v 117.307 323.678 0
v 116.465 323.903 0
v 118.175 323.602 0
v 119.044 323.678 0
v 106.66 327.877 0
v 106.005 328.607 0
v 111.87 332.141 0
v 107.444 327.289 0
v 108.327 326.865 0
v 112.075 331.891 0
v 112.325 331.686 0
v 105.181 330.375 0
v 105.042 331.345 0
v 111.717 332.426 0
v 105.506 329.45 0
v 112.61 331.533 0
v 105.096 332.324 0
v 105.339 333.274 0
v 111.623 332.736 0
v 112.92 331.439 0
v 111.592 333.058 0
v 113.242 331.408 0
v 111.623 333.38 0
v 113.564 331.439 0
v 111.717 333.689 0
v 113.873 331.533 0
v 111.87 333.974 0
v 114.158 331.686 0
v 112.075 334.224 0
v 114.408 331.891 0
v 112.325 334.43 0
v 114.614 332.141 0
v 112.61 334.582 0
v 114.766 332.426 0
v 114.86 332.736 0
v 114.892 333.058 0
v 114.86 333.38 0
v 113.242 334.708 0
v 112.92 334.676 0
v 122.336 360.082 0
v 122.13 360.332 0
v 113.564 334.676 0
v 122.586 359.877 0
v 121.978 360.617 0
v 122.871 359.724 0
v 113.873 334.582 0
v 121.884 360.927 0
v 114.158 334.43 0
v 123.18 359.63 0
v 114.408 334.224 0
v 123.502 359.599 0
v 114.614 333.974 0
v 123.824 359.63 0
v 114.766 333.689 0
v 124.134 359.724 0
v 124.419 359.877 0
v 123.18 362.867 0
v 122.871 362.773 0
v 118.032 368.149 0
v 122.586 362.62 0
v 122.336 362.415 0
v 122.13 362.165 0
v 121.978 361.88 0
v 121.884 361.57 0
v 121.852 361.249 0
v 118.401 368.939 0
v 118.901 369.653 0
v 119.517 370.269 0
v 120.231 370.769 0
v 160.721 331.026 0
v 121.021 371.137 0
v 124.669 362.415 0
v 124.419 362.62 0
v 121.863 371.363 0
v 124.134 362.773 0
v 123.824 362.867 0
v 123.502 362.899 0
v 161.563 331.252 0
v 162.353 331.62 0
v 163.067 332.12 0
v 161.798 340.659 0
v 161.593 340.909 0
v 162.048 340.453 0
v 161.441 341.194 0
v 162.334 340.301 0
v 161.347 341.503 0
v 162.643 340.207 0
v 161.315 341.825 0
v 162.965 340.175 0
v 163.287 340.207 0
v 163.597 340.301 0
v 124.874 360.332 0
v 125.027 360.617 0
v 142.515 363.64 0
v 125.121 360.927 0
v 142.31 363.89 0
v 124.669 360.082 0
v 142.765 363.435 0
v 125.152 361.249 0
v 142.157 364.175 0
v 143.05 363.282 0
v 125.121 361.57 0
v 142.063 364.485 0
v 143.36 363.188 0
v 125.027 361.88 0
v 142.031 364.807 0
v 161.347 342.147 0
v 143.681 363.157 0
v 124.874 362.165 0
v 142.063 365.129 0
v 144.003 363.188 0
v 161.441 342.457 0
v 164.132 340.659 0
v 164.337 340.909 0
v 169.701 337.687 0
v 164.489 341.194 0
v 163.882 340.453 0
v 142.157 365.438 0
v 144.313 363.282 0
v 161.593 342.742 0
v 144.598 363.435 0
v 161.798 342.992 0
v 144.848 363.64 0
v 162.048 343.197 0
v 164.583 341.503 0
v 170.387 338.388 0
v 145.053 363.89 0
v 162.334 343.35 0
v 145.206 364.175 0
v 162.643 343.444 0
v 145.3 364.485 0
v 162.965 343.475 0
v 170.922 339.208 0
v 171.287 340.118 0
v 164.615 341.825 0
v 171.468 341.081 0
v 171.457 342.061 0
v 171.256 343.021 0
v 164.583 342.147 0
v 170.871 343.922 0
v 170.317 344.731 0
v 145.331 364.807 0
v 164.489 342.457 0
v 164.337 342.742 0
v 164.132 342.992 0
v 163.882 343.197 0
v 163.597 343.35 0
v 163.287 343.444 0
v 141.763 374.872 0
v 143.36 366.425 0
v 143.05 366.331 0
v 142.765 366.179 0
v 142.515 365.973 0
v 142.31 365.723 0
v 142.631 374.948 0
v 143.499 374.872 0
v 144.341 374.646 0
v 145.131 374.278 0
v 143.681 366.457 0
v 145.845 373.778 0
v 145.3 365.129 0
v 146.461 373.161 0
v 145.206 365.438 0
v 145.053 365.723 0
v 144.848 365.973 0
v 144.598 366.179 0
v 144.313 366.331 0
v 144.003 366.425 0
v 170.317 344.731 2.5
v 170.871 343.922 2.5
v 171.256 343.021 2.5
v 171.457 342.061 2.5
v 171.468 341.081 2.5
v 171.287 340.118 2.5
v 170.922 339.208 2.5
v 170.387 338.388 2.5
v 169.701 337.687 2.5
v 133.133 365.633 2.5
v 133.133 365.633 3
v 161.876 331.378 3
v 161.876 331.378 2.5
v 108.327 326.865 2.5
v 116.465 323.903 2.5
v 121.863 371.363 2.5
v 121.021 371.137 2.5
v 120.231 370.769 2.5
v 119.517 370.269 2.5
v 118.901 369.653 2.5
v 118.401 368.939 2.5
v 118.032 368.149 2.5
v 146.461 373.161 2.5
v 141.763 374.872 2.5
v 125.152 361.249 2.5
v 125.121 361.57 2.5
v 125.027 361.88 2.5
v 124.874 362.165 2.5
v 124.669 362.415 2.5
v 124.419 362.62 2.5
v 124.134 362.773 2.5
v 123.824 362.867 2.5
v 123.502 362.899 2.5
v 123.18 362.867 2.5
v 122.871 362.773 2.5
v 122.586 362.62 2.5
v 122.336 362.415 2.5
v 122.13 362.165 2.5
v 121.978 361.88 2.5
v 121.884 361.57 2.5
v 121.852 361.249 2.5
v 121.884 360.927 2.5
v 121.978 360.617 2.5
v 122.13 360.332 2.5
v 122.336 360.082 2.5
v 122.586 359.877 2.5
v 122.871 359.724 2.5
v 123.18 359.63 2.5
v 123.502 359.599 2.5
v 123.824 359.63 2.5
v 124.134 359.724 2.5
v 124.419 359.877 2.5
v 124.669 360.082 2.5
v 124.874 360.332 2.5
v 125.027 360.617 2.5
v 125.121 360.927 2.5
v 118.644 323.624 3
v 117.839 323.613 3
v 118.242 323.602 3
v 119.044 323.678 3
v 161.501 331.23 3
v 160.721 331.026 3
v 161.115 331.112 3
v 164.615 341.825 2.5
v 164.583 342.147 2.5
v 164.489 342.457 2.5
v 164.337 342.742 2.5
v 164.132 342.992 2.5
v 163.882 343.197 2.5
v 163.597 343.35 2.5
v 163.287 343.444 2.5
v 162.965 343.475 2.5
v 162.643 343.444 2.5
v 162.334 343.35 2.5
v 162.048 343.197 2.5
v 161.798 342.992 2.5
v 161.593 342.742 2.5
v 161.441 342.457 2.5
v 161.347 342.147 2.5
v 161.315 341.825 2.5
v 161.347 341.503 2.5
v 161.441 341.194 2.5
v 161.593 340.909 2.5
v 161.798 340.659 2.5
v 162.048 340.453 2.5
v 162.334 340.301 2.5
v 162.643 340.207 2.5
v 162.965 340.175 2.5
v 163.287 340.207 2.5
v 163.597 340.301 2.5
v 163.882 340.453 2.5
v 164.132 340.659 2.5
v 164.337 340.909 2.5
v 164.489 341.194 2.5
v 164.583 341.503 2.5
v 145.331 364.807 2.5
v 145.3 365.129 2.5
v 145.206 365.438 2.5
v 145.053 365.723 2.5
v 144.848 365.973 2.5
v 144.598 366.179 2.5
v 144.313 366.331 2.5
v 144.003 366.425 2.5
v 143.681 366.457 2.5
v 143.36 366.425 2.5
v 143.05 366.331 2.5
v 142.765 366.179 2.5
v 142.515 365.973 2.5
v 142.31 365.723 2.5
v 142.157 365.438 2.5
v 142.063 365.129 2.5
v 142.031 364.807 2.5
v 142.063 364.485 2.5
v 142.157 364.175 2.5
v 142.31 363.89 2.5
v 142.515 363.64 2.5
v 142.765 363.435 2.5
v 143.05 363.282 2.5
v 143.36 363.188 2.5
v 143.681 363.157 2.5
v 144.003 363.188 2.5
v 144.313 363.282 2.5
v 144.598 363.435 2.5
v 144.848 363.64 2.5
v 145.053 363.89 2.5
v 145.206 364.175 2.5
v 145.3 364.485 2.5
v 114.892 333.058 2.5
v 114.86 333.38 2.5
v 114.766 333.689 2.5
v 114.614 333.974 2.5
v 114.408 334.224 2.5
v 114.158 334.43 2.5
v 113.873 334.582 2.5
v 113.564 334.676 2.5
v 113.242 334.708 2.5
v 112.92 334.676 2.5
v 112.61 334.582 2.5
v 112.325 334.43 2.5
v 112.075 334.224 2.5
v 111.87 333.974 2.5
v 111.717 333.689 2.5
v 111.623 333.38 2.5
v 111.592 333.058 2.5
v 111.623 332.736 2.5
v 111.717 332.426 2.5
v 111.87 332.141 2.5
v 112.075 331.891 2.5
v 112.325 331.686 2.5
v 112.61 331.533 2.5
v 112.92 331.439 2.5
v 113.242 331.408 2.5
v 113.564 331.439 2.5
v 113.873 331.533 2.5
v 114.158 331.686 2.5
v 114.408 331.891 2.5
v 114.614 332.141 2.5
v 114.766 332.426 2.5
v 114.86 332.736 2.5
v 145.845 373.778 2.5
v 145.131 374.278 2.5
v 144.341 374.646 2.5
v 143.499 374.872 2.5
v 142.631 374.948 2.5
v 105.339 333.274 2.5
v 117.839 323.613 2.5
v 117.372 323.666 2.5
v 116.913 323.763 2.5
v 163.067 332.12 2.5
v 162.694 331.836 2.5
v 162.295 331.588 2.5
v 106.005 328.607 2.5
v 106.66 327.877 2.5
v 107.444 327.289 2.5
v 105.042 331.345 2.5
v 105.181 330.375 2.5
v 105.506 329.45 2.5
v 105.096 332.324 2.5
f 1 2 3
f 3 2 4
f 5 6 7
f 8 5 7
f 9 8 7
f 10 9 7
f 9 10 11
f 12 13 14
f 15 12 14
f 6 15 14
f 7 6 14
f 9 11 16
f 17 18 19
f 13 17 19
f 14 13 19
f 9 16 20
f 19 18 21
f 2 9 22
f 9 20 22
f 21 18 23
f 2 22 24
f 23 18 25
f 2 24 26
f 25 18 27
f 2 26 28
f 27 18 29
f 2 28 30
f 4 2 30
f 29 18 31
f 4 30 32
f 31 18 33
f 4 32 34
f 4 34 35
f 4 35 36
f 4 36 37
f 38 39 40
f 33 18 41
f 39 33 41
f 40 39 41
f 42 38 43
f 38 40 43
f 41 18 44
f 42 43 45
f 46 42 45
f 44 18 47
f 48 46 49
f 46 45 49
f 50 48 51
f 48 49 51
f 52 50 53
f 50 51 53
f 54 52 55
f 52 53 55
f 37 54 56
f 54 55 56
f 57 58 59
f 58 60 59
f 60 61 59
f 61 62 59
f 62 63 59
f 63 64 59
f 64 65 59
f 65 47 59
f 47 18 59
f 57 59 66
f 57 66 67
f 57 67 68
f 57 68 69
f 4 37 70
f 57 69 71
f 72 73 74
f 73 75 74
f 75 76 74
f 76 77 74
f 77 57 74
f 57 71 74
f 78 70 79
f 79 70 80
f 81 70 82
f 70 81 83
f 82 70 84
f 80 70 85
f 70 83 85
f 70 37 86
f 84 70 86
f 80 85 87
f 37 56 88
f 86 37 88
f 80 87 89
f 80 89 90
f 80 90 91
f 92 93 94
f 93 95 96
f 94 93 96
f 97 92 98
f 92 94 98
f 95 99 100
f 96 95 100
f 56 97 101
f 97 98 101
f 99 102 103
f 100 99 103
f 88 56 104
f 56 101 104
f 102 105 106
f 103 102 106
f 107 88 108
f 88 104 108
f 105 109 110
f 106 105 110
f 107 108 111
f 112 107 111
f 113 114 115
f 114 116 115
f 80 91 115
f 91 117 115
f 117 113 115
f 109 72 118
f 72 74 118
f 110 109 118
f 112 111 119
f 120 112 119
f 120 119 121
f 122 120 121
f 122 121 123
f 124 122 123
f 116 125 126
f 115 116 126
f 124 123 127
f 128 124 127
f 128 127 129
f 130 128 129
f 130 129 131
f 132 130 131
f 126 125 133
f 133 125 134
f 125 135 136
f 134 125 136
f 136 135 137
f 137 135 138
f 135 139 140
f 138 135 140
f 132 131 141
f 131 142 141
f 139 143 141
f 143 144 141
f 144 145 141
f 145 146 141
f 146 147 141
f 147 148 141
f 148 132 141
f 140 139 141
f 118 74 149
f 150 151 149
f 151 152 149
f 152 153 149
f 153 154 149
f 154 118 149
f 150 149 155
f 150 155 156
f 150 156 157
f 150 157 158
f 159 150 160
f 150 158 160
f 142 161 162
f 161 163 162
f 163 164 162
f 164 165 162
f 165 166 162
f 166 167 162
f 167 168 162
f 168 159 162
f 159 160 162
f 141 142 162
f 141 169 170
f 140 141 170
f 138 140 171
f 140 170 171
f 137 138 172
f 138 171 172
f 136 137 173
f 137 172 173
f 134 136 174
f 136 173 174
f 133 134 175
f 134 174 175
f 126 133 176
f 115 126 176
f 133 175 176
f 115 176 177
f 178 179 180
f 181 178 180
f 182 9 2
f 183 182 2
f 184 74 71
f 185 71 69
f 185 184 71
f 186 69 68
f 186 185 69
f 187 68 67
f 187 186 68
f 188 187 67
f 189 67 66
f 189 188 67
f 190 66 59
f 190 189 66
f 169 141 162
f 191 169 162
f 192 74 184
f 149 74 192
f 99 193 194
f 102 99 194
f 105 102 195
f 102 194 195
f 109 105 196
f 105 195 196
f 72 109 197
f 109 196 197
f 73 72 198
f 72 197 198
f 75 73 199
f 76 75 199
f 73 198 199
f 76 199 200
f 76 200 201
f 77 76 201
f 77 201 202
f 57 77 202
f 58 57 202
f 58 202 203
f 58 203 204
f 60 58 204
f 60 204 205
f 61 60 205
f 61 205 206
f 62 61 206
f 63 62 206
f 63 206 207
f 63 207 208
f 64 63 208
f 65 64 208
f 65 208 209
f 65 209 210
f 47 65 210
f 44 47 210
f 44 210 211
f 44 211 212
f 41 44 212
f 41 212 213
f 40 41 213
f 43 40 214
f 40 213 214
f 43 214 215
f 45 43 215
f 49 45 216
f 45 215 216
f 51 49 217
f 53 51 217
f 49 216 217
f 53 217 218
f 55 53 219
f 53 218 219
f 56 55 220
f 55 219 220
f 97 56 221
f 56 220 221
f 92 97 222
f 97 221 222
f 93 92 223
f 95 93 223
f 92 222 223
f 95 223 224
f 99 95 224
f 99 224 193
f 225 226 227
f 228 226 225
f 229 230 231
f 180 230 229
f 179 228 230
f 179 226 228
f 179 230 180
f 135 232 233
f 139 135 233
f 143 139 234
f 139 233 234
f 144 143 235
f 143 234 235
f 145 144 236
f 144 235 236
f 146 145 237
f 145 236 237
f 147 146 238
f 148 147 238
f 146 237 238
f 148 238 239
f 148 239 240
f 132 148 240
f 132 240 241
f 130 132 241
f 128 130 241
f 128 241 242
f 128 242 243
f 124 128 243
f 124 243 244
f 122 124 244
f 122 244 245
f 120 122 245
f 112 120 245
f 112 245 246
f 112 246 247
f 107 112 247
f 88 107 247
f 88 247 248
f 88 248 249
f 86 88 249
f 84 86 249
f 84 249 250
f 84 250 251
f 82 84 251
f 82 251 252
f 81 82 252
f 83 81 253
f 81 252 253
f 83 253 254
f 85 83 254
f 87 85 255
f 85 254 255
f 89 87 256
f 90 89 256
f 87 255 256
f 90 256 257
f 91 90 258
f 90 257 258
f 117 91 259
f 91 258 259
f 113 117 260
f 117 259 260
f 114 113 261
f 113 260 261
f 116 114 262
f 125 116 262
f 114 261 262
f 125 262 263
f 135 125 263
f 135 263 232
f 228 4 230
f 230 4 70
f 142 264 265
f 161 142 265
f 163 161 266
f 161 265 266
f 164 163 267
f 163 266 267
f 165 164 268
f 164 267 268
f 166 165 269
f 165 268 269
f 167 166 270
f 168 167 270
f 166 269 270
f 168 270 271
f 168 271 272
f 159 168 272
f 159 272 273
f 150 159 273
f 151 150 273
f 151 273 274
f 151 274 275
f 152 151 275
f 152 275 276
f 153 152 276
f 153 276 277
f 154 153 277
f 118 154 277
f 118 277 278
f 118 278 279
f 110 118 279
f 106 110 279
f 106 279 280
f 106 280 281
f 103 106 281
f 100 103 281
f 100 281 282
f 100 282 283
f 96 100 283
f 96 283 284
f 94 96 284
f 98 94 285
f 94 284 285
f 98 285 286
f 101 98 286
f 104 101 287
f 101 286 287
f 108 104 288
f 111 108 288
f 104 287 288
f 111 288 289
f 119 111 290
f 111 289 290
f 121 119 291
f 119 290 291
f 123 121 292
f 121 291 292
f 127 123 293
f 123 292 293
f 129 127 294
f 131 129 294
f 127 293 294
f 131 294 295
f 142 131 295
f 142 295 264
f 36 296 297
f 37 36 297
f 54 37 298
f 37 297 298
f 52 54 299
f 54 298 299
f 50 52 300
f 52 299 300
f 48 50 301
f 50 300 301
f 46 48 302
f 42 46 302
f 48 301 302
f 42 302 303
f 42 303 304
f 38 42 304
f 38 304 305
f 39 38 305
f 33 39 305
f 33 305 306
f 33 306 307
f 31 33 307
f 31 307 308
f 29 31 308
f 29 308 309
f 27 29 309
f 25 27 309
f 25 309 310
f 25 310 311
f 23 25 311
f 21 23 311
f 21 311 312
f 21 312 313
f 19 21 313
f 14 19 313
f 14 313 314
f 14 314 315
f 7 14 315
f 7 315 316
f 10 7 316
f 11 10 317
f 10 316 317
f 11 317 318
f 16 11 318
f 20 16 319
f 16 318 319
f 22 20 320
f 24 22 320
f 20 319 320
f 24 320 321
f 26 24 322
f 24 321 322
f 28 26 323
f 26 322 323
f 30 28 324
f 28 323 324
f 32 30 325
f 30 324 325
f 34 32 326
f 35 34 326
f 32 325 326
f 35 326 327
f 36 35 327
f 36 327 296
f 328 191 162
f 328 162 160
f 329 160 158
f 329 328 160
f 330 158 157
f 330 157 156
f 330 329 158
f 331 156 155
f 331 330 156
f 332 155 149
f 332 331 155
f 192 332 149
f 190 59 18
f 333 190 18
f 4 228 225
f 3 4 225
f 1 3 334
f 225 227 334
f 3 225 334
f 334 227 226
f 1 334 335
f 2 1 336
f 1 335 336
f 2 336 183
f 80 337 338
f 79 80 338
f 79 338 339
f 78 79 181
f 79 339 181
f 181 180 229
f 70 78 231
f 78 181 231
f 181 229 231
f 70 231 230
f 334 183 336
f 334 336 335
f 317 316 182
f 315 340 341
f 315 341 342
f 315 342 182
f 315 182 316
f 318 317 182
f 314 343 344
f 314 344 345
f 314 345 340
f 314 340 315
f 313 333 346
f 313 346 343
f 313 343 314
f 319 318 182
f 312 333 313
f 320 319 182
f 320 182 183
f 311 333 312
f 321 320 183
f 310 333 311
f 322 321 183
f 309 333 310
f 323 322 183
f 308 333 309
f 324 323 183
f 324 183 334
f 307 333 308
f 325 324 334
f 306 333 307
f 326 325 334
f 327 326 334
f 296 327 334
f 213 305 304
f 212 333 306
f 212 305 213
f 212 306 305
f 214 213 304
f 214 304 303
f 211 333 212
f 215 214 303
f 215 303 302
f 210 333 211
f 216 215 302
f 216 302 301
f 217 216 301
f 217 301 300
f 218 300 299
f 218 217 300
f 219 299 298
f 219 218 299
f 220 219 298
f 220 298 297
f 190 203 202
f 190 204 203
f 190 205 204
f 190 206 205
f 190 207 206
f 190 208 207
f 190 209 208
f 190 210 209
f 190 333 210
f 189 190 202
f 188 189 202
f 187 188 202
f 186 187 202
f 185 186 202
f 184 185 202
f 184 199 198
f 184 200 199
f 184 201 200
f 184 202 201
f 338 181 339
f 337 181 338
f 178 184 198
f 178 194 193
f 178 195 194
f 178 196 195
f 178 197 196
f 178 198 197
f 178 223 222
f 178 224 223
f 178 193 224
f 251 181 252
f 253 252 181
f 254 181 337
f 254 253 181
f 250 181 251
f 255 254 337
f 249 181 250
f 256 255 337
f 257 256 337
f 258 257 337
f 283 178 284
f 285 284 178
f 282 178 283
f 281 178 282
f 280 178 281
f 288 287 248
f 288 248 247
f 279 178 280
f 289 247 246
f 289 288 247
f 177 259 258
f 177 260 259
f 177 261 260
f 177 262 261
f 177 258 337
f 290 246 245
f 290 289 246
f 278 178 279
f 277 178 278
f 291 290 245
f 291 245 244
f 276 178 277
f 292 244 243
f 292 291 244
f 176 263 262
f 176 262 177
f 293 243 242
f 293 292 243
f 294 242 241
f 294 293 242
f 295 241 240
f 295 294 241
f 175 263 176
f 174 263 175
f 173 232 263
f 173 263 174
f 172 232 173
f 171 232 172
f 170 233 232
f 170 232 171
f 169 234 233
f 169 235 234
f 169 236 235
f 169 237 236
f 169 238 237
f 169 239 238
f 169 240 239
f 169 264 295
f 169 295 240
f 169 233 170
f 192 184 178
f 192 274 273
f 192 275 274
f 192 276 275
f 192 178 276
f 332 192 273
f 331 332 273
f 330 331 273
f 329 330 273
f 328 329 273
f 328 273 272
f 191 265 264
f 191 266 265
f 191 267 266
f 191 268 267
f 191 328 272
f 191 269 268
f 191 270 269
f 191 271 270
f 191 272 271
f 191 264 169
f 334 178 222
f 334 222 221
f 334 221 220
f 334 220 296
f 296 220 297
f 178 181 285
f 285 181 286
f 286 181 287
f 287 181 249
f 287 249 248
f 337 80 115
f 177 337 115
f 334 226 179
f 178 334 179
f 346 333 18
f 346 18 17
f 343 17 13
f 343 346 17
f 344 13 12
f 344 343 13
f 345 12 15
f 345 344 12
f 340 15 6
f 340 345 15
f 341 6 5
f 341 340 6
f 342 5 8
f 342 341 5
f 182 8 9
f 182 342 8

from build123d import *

# Parameters (mm, degrees)
EXTRUDE_1_DEPTH     = 3
SKETCH_2_R          = 1.65
CUT_EXTRUDE_1_DEPTH = 3
FILLET_1_R          = 5
CUT_EXTRUDE_2_DEPTH = 0.5


with BuildPart() as part:
    # ｽｹｯﾁ1 → ﾎﾞｽ - 押し出し1 (new body)
    with BuildSketch(Plane.XY):
        Polygon((173.531323483, 340.900859956), (144.605881047, 375.372859896), (133.1152144, 365.731045751), (119.019825089, 370.861347901), (103.628918639, 328.575179965), (117.724307951, 323.444877815), (162.040656836, 331.259045811), align=None)
        Polygon((144.605881047, 375.372859896), (133.1152144, 365.731045751), (119.019825089, 370.861347901), align=None)
    extrude(amount=EXTRUDE_1_DEPTH)

    # ｽｹｯﾁ2 → ｶｯﾄ - 押し出し1 (cut)
    with BuildSketch(Plane.XY.offset(3)):
        with Locations((113.24176437, 333.057723546)):
            Circle(SKETCH_2_R)
        with Locations((123.50236867, 361.24850217)):
            Circle(SKETCH_2_R)
        with Locations((143.681454796, 364.8066195)):
            Circle(SKETCH_2_R)
        with Locations((162.965083087, 341.825286207)):
            Circle(SKETCH_2_R)
    extrude(amount=-CUT_EXTRUDE_1_DEPTH, mode=Mode.SUBTRACT)

    # ﾌｨﾚｯﾄ1
    fillet_1_edges = [part.edges().sort_by_distance(p)[0] for p in [
        (173.531323483, 340.900859956, 1.5),
        (162.040656836, 331.259045811, 1.5),
        (117.724307951, 323.444877815, 1.5),
        (103.628918639, 328.575179965, 1.5),
        (119.019825089, 370.861347901, 1.5),
        (144.605881047, 375.372859896, 1.5),
    ]]
    fillet(fillet_1_edges, radius=FILLET_1_R)

    # ｽｹｯﾁ3 → ｶｯﾄ - 押し出し2 (cut)
    with BuildSketch(Plane.XY.offset(3)):
        Polygon((121.413966092, 377.439196246), (103.628918639, 328.575179965), (117.771292582, 323.427776808), (133.132579218, 365.632564976), (162.002354614, 331.22690643), (173.531323483, 340.900859956), (140.106367779, 380.735170998), (131.711632891, 373.691152049), align=None)
    extrude(amount=-CUT_EXTRUDE_2_DEPTH, mode=Mode.SUBTRACT)


solid = part.part
